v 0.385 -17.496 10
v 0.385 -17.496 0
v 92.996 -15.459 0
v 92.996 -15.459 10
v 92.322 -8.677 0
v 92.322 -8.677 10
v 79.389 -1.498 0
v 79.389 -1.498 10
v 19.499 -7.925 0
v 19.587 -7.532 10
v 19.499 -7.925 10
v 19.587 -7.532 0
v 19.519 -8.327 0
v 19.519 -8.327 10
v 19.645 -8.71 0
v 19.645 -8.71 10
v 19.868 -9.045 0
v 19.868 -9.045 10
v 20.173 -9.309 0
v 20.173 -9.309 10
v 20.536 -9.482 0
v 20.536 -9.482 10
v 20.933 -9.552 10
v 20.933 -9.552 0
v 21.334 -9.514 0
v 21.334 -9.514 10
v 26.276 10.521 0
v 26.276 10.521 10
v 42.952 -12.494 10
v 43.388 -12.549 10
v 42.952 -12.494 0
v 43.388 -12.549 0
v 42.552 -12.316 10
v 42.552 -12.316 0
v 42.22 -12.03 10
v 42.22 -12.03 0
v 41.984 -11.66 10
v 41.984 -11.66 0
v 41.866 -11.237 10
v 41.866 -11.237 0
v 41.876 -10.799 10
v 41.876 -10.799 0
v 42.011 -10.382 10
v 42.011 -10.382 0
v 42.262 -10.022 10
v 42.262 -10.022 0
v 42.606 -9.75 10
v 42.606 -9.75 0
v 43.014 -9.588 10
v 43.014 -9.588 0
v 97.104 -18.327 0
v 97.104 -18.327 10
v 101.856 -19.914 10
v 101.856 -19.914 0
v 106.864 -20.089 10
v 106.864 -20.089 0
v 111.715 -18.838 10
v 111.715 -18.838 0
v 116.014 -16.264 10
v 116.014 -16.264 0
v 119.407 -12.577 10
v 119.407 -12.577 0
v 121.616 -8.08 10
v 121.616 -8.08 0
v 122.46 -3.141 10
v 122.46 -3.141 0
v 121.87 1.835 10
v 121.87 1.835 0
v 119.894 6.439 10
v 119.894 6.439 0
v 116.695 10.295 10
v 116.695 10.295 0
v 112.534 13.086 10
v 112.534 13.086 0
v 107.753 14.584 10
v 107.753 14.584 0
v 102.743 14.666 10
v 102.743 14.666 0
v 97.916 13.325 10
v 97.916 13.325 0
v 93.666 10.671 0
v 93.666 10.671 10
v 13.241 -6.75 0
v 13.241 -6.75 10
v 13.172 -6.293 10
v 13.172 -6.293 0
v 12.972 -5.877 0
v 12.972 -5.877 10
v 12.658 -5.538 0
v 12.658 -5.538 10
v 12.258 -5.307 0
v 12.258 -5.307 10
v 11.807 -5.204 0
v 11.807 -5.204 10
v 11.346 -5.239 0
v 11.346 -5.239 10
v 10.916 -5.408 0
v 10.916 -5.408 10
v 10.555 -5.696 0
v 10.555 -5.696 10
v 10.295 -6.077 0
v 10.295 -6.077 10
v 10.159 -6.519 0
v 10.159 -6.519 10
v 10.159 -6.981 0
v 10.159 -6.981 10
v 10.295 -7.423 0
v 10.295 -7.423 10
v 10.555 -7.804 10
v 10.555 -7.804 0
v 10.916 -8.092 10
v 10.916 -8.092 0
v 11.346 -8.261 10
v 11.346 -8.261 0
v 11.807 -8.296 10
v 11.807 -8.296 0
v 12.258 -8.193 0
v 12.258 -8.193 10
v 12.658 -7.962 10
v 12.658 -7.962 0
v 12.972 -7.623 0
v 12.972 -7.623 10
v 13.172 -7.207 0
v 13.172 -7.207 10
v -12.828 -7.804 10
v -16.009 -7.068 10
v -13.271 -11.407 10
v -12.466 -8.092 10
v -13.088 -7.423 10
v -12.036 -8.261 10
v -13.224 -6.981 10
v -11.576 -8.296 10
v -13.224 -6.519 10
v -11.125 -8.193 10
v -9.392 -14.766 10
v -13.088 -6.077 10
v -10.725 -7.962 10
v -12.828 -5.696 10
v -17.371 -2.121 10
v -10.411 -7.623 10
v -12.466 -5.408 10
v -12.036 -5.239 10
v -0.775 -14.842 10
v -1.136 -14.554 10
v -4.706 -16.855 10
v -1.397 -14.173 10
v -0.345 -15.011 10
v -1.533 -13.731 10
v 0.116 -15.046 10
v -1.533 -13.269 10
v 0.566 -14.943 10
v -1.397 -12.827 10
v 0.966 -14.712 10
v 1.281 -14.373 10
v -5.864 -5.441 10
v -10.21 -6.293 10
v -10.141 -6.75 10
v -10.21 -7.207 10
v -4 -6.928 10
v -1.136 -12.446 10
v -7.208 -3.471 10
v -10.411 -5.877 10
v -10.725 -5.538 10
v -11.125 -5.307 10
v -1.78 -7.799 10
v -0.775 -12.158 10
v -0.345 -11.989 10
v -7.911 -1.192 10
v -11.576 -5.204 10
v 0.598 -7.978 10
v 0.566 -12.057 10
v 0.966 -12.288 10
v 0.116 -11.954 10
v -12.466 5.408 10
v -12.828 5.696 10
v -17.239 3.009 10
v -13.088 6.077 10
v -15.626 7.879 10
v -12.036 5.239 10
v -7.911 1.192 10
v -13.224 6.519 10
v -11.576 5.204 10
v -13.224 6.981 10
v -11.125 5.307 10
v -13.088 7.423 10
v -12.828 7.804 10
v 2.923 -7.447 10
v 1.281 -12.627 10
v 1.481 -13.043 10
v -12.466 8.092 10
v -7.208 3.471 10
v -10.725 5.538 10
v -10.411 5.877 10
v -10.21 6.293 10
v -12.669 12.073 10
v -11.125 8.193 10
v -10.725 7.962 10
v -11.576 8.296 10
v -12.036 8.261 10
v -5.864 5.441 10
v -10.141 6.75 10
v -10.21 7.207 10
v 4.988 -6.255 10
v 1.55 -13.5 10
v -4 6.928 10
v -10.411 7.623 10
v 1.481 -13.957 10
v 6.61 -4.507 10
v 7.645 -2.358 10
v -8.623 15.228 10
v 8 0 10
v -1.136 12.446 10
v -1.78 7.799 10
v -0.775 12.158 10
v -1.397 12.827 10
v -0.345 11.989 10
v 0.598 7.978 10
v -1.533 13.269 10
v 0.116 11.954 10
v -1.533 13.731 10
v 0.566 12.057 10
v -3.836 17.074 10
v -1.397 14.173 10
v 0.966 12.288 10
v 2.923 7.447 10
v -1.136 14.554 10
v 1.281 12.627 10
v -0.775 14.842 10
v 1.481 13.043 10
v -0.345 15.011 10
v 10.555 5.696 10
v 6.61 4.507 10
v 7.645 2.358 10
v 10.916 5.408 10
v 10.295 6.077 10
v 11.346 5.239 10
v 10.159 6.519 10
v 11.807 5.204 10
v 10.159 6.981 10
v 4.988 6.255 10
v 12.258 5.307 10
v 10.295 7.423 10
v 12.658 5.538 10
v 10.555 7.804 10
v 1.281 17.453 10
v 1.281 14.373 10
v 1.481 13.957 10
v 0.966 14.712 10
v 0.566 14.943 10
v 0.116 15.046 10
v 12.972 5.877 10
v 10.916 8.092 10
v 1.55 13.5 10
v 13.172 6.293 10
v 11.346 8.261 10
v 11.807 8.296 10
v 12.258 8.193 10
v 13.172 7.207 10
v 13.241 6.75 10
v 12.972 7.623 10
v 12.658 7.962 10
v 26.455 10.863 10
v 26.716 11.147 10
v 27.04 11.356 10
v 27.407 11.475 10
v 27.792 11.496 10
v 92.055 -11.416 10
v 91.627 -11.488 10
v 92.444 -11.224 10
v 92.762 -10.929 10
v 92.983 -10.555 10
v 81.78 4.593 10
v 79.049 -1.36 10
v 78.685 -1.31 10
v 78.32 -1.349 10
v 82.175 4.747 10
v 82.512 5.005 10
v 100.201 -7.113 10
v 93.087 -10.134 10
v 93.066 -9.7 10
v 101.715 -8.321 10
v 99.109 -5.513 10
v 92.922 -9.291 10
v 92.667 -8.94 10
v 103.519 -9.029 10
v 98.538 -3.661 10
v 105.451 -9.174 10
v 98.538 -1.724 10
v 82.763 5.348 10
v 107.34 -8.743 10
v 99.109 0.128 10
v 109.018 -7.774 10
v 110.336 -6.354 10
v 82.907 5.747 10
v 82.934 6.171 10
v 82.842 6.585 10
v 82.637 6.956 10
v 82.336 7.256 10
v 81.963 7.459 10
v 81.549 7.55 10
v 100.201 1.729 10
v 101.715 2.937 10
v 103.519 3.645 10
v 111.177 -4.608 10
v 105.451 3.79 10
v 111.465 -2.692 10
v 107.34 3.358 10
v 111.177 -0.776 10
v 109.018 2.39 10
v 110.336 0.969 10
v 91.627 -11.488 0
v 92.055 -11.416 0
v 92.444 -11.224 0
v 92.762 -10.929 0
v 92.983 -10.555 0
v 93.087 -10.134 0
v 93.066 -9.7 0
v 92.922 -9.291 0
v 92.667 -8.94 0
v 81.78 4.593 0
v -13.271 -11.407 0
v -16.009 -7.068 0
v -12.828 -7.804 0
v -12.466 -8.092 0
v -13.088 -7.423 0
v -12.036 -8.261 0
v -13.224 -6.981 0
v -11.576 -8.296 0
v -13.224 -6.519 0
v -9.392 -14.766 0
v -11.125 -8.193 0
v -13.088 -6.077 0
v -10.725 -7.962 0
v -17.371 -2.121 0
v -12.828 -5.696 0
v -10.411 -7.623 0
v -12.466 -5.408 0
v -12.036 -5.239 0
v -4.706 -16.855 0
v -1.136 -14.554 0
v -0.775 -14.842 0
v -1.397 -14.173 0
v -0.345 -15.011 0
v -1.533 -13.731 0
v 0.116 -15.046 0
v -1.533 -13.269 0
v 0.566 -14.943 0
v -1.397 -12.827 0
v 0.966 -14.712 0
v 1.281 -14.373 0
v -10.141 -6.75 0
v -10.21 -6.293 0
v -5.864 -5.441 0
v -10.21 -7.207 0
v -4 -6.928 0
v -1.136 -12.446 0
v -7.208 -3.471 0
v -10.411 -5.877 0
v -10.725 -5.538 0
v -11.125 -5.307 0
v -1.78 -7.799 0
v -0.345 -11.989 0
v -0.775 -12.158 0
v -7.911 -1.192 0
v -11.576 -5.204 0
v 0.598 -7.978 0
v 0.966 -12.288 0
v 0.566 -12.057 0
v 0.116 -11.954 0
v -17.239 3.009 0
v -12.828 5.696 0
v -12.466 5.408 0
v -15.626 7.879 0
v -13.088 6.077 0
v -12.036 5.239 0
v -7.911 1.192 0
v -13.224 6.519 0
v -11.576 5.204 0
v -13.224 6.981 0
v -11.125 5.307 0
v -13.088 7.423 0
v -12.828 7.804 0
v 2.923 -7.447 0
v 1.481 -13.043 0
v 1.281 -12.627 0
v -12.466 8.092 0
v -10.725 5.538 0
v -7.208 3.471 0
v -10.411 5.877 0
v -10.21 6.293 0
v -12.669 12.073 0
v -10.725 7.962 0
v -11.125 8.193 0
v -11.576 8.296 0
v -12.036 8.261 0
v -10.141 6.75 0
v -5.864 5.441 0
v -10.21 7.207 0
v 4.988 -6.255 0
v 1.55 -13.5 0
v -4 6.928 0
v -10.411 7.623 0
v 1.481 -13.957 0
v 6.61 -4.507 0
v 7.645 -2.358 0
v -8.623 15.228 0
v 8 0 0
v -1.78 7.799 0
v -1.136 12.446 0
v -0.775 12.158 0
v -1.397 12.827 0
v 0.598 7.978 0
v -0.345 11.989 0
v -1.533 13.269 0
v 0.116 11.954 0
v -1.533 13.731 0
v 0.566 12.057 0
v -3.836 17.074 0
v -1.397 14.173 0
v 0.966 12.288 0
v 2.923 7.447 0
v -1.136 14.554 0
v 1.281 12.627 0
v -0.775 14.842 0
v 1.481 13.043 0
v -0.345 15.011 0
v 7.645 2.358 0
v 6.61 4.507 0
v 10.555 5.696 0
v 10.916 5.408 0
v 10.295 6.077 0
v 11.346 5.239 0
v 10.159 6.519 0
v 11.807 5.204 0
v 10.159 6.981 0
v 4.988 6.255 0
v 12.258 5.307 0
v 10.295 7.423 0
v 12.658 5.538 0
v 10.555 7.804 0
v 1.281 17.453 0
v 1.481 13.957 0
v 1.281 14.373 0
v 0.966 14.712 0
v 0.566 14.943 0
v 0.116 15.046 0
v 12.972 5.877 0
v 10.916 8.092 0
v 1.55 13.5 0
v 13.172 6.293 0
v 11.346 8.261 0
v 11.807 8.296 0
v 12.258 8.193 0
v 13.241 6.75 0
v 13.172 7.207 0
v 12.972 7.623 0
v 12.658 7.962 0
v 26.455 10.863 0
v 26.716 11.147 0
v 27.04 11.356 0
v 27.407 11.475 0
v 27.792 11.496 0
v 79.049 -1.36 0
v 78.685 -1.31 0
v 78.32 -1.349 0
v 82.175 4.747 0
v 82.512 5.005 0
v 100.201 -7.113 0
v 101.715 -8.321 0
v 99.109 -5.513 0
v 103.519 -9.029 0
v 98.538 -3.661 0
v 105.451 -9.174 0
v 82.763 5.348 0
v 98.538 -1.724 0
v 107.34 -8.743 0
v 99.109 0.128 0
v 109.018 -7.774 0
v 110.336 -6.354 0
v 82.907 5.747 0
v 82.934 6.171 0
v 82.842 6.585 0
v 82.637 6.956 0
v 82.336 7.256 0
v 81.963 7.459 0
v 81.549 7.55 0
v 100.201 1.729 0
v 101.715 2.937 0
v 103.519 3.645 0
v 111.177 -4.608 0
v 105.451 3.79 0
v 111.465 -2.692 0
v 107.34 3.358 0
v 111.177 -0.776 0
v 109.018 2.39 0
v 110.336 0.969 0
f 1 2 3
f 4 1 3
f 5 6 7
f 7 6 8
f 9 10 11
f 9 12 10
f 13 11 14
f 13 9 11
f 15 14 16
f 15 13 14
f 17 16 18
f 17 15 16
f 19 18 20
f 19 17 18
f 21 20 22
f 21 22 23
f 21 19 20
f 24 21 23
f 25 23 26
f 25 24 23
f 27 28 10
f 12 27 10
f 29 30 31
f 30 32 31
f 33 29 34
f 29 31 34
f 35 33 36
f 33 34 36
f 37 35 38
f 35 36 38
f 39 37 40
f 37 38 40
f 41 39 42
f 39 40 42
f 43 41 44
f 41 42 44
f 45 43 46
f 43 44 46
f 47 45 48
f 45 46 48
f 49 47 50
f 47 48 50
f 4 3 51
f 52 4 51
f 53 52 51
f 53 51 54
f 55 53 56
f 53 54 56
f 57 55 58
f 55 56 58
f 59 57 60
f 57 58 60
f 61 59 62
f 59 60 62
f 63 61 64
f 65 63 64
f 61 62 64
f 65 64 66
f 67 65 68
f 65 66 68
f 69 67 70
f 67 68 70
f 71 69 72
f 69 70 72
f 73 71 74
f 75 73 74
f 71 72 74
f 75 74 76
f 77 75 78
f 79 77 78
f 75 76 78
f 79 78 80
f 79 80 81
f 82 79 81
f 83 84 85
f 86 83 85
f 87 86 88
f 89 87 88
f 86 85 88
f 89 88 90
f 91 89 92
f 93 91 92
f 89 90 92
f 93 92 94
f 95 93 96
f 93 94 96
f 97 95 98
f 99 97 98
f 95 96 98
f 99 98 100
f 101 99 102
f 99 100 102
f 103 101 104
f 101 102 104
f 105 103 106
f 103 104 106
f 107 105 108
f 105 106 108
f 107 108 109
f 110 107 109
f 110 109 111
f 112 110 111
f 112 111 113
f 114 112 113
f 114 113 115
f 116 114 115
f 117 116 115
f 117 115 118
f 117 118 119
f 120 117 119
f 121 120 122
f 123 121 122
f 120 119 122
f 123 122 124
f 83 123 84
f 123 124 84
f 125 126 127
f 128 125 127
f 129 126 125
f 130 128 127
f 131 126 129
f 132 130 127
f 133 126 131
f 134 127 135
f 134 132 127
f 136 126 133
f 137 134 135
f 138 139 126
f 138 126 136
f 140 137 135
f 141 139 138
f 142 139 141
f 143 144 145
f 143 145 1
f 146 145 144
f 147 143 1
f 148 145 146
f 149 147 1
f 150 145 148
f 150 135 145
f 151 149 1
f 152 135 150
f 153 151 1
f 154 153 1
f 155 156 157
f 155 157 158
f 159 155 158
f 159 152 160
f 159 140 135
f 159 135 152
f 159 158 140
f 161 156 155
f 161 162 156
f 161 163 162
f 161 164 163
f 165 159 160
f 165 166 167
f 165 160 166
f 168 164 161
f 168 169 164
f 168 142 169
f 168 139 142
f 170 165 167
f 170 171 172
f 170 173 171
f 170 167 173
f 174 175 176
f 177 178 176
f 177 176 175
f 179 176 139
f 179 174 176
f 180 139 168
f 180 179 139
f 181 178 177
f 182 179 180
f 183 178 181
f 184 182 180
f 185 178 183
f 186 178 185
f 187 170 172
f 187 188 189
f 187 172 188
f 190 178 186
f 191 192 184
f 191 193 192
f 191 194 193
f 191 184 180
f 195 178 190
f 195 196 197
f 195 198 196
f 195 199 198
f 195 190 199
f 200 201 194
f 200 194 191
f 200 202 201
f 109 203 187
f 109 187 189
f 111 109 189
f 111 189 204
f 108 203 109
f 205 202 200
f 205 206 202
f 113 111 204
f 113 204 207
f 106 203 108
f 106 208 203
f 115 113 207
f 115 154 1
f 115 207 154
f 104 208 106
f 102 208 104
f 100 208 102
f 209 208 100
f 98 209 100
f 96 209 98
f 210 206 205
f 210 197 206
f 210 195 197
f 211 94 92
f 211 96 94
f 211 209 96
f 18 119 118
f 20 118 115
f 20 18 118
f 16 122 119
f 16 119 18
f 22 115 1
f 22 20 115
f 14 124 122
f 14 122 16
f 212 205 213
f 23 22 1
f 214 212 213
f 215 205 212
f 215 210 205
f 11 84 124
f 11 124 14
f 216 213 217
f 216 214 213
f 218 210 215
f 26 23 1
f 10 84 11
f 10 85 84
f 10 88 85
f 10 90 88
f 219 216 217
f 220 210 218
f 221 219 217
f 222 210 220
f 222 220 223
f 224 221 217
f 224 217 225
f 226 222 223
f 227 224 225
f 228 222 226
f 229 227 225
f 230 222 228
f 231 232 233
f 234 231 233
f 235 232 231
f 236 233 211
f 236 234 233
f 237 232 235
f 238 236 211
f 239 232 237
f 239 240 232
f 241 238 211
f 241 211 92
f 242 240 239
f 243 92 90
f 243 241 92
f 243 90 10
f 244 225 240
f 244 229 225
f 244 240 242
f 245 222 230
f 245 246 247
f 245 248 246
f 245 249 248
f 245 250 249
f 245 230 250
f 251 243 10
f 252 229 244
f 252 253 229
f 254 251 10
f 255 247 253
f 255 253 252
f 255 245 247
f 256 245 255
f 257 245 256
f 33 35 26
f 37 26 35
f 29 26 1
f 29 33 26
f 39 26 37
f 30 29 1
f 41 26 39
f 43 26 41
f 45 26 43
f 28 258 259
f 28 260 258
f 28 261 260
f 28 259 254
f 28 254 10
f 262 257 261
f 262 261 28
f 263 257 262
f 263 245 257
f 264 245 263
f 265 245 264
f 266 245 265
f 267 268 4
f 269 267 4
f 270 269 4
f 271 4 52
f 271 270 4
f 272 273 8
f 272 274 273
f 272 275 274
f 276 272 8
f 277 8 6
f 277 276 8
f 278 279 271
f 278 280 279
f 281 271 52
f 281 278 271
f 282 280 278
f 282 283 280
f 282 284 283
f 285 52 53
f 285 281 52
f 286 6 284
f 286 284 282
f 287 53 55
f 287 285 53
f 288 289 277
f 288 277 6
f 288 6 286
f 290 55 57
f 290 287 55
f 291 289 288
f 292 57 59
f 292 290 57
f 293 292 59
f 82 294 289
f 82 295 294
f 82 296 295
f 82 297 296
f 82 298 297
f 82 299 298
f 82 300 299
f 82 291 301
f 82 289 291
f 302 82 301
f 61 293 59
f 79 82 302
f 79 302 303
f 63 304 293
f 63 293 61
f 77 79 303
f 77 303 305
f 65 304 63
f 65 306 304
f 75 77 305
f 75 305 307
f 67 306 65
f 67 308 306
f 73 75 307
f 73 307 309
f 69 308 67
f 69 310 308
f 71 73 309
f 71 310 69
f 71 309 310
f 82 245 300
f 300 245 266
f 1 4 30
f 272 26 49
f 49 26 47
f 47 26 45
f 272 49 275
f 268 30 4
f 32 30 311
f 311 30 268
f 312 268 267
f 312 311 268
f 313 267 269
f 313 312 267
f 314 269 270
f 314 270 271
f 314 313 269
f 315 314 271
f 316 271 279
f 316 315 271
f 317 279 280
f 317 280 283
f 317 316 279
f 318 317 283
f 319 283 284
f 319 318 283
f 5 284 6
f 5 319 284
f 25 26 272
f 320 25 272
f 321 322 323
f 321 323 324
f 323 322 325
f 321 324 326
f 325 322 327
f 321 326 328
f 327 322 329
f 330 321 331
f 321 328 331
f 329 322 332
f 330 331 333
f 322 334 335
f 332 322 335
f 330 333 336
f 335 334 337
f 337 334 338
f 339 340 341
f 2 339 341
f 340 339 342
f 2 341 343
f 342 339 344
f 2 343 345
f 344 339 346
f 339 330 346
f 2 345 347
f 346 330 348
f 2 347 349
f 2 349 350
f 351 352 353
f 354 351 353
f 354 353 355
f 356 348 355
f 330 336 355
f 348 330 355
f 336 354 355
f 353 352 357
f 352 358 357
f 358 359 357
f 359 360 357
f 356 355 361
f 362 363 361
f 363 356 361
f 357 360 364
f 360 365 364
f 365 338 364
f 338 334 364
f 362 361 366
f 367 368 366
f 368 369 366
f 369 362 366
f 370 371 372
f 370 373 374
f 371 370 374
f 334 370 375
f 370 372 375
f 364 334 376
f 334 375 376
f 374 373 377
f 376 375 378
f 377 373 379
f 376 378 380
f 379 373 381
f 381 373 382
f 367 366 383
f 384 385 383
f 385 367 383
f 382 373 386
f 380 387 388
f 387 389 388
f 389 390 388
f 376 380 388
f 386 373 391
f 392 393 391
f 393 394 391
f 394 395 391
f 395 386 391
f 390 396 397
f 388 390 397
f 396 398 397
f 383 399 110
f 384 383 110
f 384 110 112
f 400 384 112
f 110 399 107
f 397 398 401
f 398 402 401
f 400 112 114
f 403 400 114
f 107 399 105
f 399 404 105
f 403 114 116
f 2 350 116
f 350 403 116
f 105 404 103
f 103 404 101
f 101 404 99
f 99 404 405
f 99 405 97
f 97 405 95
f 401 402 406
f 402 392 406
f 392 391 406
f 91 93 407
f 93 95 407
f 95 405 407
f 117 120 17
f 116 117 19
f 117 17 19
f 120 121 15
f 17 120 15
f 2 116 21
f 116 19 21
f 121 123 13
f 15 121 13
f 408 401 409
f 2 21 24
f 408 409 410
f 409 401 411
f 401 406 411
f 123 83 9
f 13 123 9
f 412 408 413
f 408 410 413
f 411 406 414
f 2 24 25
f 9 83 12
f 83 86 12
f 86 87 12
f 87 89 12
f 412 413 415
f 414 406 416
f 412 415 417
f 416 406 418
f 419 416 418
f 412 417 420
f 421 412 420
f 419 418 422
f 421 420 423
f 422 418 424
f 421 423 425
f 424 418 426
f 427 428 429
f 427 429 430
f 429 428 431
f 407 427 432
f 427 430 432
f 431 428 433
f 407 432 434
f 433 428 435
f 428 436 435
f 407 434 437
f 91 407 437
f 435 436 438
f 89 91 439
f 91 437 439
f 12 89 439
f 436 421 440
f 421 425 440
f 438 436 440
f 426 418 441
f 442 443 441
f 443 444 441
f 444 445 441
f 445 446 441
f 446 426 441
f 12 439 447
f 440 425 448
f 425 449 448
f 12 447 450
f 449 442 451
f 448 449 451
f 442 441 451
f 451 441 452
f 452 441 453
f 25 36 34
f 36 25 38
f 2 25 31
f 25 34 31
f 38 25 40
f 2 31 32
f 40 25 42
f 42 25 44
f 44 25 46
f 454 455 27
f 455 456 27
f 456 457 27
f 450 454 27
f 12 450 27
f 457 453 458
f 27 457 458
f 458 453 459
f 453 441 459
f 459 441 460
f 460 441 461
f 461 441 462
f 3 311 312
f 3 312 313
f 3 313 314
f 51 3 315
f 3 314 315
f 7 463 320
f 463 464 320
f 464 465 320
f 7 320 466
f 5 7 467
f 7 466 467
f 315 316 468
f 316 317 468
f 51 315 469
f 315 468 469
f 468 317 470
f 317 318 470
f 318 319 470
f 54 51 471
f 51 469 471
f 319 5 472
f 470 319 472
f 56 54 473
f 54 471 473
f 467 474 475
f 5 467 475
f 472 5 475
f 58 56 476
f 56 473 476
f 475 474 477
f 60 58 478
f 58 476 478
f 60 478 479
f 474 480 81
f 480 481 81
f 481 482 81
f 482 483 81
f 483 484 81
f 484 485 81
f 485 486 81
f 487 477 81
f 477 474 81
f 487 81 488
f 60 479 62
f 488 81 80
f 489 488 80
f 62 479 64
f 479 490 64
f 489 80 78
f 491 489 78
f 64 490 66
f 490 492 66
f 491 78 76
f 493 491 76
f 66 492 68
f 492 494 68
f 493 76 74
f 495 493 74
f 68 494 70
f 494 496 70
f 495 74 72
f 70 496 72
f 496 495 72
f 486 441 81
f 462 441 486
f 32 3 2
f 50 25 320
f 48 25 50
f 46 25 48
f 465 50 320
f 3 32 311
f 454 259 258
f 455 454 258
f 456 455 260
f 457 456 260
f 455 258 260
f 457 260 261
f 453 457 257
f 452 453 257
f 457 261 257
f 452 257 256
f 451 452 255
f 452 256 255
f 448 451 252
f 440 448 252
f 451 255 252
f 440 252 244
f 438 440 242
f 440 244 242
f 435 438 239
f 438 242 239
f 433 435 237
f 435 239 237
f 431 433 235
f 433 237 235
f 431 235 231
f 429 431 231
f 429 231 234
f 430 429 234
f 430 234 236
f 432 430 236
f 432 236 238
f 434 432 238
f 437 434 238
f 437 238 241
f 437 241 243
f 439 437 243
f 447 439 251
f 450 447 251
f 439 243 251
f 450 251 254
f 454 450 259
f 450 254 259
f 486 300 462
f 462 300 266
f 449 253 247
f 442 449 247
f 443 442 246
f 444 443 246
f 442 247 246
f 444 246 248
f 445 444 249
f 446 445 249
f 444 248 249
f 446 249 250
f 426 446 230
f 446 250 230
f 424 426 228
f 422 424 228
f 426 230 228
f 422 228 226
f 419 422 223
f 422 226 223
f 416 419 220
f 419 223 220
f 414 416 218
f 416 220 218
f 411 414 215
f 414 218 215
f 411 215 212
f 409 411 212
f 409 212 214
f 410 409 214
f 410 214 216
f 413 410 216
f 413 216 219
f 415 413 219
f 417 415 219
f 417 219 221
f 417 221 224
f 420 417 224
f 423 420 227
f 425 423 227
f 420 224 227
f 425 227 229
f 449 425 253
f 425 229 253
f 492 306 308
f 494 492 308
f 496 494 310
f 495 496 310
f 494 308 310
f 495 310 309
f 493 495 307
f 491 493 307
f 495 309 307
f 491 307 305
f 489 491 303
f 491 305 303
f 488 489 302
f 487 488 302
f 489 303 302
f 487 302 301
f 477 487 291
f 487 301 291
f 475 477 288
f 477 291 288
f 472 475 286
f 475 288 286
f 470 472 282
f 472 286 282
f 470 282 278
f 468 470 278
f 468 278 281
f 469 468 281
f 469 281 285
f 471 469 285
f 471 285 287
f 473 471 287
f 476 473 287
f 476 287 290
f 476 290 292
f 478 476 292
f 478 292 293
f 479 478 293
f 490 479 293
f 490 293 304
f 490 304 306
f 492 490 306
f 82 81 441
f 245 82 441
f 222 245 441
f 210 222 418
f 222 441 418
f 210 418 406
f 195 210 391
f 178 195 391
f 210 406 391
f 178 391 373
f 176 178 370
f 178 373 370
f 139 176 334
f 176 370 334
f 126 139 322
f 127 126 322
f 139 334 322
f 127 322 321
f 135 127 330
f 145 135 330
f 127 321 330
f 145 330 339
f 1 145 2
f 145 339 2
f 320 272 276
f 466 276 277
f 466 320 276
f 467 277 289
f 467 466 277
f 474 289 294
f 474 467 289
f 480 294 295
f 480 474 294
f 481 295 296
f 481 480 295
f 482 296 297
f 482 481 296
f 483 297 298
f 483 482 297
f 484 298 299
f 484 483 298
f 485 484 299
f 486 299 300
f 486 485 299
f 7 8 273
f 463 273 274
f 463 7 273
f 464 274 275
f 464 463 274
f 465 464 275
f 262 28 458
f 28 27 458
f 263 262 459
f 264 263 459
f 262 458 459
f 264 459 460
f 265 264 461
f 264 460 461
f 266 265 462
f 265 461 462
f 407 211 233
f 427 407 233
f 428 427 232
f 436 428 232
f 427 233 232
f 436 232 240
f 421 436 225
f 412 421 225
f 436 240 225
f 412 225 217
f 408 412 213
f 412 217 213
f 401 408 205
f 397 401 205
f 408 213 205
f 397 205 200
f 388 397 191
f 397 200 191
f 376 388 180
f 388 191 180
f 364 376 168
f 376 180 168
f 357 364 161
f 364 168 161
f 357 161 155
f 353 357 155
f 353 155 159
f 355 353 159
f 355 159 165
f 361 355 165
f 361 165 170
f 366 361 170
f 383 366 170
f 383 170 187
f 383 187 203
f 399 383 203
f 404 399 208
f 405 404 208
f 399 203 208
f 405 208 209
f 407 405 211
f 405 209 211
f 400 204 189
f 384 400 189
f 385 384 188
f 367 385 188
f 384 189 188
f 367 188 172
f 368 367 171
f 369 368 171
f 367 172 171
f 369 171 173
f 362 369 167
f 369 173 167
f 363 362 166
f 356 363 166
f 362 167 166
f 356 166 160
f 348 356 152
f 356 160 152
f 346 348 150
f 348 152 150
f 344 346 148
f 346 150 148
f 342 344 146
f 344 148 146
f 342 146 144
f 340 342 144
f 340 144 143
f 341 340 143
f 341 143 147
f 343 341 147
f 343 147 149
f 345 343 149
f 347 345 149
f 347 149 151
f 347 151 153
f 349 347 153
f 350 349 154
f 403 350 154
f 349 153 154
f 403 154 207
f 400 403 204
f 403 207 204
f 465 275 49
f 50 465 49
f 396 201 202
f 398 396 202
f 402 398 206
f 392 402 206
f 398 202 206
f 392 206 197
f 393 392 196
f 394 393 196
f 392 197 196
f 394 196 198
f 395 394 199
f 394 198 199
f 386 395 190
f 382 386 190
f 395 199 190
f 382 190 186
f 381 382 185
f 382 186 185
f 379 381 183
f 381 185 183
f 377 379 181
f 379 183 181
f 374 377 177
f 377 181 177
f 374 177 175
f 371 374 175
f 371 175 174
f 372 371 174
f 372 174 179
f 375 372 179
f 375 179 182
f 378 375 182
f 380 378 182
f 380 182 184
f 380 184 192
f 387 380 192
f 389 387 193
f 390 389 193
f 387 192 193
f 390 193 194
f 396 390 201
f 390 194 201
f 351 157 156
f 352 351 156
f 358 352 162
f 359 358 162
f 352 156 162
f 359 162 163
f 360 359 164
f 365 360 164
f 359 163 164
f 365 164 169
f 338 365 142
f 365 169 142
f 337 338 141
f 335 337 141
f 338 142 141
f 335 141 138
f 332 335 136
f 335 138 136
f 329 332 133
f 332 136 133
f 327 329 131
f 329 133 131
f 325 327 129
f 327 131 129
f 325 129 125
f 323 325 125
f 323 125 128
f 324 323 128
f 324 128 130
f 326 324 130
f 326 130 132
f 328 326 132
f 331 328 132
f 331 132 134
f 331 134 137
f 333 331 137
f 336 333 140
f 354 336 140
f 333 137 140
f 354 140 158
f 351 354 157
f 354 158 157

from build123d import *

# Parameters (mm, degrees)
EXTRUDE_1_DEPTH     = 10
SKETCH_2_R          = 1.55
SKETCH_2_R_2        = 8
CUT_EXTRUDE_1_DEPTH = 10
CUT_EXTRUDE_2_DEPTH = 25
FILLET_1_R          = 1.5
SKETCH_4_R          = 6.5
CUT_EXTRUDE_3_DEPTH = 25
EXTRUDE_START       = -10
EXTRUDE_2_DEPTH     = 10


with BuildPart() as part:
    # 草图1 → 凸台-拉伸1 (new body)
    with BuildSketch(Plane.XY):
        with BuildLine():
            Line((105.880667011, 9.774167654), (1.281264399, 17.453033018))
            ThreePointArc((1.281264399, 17.453033018), (-17.494246359, 0.448714084), (0.384854302, -17.495767693))
            Line((0.384854302, -17.495767693), (105.240374084, -15.189261425))
            ThreePointArc((105.240374084, -15.189261425), (117.461368411, -3.012794561), (105.880667011, 9.774167654))
        make_face()
    extrude(amount=EXTRUDE_1_DEPTH)

    # 草图2 → 切除-拉伸1 (cut)
    with BuildSketch(Plane.XY.offset(10)):
        with Locations((0, 13.5)):
            Circle(SKETCH_2_R)
        with Locations((11.691342951, 6.75)):
            Circle(SKETCH_2_R)
        with Locations((11.691342951, -6.75)):
            Circle(SKETCH_2_R)
        with Locations((0, -13.5)):
            Circle(SKETCH_2_R)
        with Locations((-11.691342951, -6.75)):
            Circle(SKETCH_2_R)
        with Locations((-11.691342951, 6.75)):
            Circle(SKETCH_2_R)
        Circle(SKETCH_2_R_2)
    extrude(amount=-CUT_EXTRUDE_1_DEPTH, mode=Mode.SUBTRACT)

    # 草图3 → 切除-拉伸2 (cut)
    with BuildSketch(Plane.XY.offset(10)):
        Polygon((28.969702276, -12.866019337), (97.16669186, -11.365890548), (78.883612283, -1.217324734), align=None)
        Polygon((26.667415907, 11.578617262), (18.617416428, -10.147636057), (91.362216416, 6.829233896), align=None)
    extrude(amount=-CUT_EXTRUDE_2_DEPTH, mode=Mode.SUBTRACT)

    # 圆角1
    fillet_1_edges = [part.edges().sort_by_distance(p)[0] for p in [
        (26.667415907, 11.578617262, 5),
        (91.362216416, 6.829233896, 5),
        (18.617416428, -10.147636057, 5),
        (28.969702276, -12.866019337, 5),
        (78.883612283, -1.217324734, 5),
        (97.16669186, -11.365890548, 5),
    ]]
    fillet(fillet_1_edges, radius=FILLET_1_R)

    # 草图4 → 切除-拉伸3 (cut)
    with BuildSketch(Plane.XY.offset(10)):
        with Locations((104.965478154, -2.692284502)):
            Circle(SKETCH_4_R)
    extrude(amount=-CUT_EXTRUDE_3_DEPTH, mode=Mode.SUBTRACT)

    # 草图5 → 凸台-拉伸2 (add)
    with BuildSketch(Plane.XY.offset(10).offset(EXTRUDE_START)):
        with BuildLine():
            Line((93.666088337, 10.670865941), (105.880667011, 9.774167654))
            ThreePointArc((105.880667011, 9.774167654), (117.461368411, -3.012794561), (105.240374084, -15.189261425))
            Line((105.240374084, -15.189261425), (92.995887368, -15.458603329))
            ThreePointArc((92.995887368, -15.458603329), (122.459724513, -3.140998585), (93.666088337, 10.670865941))
        make_face()
    extrude(amount=EXTRUDE_2_DEPTH)


solid = part.part
